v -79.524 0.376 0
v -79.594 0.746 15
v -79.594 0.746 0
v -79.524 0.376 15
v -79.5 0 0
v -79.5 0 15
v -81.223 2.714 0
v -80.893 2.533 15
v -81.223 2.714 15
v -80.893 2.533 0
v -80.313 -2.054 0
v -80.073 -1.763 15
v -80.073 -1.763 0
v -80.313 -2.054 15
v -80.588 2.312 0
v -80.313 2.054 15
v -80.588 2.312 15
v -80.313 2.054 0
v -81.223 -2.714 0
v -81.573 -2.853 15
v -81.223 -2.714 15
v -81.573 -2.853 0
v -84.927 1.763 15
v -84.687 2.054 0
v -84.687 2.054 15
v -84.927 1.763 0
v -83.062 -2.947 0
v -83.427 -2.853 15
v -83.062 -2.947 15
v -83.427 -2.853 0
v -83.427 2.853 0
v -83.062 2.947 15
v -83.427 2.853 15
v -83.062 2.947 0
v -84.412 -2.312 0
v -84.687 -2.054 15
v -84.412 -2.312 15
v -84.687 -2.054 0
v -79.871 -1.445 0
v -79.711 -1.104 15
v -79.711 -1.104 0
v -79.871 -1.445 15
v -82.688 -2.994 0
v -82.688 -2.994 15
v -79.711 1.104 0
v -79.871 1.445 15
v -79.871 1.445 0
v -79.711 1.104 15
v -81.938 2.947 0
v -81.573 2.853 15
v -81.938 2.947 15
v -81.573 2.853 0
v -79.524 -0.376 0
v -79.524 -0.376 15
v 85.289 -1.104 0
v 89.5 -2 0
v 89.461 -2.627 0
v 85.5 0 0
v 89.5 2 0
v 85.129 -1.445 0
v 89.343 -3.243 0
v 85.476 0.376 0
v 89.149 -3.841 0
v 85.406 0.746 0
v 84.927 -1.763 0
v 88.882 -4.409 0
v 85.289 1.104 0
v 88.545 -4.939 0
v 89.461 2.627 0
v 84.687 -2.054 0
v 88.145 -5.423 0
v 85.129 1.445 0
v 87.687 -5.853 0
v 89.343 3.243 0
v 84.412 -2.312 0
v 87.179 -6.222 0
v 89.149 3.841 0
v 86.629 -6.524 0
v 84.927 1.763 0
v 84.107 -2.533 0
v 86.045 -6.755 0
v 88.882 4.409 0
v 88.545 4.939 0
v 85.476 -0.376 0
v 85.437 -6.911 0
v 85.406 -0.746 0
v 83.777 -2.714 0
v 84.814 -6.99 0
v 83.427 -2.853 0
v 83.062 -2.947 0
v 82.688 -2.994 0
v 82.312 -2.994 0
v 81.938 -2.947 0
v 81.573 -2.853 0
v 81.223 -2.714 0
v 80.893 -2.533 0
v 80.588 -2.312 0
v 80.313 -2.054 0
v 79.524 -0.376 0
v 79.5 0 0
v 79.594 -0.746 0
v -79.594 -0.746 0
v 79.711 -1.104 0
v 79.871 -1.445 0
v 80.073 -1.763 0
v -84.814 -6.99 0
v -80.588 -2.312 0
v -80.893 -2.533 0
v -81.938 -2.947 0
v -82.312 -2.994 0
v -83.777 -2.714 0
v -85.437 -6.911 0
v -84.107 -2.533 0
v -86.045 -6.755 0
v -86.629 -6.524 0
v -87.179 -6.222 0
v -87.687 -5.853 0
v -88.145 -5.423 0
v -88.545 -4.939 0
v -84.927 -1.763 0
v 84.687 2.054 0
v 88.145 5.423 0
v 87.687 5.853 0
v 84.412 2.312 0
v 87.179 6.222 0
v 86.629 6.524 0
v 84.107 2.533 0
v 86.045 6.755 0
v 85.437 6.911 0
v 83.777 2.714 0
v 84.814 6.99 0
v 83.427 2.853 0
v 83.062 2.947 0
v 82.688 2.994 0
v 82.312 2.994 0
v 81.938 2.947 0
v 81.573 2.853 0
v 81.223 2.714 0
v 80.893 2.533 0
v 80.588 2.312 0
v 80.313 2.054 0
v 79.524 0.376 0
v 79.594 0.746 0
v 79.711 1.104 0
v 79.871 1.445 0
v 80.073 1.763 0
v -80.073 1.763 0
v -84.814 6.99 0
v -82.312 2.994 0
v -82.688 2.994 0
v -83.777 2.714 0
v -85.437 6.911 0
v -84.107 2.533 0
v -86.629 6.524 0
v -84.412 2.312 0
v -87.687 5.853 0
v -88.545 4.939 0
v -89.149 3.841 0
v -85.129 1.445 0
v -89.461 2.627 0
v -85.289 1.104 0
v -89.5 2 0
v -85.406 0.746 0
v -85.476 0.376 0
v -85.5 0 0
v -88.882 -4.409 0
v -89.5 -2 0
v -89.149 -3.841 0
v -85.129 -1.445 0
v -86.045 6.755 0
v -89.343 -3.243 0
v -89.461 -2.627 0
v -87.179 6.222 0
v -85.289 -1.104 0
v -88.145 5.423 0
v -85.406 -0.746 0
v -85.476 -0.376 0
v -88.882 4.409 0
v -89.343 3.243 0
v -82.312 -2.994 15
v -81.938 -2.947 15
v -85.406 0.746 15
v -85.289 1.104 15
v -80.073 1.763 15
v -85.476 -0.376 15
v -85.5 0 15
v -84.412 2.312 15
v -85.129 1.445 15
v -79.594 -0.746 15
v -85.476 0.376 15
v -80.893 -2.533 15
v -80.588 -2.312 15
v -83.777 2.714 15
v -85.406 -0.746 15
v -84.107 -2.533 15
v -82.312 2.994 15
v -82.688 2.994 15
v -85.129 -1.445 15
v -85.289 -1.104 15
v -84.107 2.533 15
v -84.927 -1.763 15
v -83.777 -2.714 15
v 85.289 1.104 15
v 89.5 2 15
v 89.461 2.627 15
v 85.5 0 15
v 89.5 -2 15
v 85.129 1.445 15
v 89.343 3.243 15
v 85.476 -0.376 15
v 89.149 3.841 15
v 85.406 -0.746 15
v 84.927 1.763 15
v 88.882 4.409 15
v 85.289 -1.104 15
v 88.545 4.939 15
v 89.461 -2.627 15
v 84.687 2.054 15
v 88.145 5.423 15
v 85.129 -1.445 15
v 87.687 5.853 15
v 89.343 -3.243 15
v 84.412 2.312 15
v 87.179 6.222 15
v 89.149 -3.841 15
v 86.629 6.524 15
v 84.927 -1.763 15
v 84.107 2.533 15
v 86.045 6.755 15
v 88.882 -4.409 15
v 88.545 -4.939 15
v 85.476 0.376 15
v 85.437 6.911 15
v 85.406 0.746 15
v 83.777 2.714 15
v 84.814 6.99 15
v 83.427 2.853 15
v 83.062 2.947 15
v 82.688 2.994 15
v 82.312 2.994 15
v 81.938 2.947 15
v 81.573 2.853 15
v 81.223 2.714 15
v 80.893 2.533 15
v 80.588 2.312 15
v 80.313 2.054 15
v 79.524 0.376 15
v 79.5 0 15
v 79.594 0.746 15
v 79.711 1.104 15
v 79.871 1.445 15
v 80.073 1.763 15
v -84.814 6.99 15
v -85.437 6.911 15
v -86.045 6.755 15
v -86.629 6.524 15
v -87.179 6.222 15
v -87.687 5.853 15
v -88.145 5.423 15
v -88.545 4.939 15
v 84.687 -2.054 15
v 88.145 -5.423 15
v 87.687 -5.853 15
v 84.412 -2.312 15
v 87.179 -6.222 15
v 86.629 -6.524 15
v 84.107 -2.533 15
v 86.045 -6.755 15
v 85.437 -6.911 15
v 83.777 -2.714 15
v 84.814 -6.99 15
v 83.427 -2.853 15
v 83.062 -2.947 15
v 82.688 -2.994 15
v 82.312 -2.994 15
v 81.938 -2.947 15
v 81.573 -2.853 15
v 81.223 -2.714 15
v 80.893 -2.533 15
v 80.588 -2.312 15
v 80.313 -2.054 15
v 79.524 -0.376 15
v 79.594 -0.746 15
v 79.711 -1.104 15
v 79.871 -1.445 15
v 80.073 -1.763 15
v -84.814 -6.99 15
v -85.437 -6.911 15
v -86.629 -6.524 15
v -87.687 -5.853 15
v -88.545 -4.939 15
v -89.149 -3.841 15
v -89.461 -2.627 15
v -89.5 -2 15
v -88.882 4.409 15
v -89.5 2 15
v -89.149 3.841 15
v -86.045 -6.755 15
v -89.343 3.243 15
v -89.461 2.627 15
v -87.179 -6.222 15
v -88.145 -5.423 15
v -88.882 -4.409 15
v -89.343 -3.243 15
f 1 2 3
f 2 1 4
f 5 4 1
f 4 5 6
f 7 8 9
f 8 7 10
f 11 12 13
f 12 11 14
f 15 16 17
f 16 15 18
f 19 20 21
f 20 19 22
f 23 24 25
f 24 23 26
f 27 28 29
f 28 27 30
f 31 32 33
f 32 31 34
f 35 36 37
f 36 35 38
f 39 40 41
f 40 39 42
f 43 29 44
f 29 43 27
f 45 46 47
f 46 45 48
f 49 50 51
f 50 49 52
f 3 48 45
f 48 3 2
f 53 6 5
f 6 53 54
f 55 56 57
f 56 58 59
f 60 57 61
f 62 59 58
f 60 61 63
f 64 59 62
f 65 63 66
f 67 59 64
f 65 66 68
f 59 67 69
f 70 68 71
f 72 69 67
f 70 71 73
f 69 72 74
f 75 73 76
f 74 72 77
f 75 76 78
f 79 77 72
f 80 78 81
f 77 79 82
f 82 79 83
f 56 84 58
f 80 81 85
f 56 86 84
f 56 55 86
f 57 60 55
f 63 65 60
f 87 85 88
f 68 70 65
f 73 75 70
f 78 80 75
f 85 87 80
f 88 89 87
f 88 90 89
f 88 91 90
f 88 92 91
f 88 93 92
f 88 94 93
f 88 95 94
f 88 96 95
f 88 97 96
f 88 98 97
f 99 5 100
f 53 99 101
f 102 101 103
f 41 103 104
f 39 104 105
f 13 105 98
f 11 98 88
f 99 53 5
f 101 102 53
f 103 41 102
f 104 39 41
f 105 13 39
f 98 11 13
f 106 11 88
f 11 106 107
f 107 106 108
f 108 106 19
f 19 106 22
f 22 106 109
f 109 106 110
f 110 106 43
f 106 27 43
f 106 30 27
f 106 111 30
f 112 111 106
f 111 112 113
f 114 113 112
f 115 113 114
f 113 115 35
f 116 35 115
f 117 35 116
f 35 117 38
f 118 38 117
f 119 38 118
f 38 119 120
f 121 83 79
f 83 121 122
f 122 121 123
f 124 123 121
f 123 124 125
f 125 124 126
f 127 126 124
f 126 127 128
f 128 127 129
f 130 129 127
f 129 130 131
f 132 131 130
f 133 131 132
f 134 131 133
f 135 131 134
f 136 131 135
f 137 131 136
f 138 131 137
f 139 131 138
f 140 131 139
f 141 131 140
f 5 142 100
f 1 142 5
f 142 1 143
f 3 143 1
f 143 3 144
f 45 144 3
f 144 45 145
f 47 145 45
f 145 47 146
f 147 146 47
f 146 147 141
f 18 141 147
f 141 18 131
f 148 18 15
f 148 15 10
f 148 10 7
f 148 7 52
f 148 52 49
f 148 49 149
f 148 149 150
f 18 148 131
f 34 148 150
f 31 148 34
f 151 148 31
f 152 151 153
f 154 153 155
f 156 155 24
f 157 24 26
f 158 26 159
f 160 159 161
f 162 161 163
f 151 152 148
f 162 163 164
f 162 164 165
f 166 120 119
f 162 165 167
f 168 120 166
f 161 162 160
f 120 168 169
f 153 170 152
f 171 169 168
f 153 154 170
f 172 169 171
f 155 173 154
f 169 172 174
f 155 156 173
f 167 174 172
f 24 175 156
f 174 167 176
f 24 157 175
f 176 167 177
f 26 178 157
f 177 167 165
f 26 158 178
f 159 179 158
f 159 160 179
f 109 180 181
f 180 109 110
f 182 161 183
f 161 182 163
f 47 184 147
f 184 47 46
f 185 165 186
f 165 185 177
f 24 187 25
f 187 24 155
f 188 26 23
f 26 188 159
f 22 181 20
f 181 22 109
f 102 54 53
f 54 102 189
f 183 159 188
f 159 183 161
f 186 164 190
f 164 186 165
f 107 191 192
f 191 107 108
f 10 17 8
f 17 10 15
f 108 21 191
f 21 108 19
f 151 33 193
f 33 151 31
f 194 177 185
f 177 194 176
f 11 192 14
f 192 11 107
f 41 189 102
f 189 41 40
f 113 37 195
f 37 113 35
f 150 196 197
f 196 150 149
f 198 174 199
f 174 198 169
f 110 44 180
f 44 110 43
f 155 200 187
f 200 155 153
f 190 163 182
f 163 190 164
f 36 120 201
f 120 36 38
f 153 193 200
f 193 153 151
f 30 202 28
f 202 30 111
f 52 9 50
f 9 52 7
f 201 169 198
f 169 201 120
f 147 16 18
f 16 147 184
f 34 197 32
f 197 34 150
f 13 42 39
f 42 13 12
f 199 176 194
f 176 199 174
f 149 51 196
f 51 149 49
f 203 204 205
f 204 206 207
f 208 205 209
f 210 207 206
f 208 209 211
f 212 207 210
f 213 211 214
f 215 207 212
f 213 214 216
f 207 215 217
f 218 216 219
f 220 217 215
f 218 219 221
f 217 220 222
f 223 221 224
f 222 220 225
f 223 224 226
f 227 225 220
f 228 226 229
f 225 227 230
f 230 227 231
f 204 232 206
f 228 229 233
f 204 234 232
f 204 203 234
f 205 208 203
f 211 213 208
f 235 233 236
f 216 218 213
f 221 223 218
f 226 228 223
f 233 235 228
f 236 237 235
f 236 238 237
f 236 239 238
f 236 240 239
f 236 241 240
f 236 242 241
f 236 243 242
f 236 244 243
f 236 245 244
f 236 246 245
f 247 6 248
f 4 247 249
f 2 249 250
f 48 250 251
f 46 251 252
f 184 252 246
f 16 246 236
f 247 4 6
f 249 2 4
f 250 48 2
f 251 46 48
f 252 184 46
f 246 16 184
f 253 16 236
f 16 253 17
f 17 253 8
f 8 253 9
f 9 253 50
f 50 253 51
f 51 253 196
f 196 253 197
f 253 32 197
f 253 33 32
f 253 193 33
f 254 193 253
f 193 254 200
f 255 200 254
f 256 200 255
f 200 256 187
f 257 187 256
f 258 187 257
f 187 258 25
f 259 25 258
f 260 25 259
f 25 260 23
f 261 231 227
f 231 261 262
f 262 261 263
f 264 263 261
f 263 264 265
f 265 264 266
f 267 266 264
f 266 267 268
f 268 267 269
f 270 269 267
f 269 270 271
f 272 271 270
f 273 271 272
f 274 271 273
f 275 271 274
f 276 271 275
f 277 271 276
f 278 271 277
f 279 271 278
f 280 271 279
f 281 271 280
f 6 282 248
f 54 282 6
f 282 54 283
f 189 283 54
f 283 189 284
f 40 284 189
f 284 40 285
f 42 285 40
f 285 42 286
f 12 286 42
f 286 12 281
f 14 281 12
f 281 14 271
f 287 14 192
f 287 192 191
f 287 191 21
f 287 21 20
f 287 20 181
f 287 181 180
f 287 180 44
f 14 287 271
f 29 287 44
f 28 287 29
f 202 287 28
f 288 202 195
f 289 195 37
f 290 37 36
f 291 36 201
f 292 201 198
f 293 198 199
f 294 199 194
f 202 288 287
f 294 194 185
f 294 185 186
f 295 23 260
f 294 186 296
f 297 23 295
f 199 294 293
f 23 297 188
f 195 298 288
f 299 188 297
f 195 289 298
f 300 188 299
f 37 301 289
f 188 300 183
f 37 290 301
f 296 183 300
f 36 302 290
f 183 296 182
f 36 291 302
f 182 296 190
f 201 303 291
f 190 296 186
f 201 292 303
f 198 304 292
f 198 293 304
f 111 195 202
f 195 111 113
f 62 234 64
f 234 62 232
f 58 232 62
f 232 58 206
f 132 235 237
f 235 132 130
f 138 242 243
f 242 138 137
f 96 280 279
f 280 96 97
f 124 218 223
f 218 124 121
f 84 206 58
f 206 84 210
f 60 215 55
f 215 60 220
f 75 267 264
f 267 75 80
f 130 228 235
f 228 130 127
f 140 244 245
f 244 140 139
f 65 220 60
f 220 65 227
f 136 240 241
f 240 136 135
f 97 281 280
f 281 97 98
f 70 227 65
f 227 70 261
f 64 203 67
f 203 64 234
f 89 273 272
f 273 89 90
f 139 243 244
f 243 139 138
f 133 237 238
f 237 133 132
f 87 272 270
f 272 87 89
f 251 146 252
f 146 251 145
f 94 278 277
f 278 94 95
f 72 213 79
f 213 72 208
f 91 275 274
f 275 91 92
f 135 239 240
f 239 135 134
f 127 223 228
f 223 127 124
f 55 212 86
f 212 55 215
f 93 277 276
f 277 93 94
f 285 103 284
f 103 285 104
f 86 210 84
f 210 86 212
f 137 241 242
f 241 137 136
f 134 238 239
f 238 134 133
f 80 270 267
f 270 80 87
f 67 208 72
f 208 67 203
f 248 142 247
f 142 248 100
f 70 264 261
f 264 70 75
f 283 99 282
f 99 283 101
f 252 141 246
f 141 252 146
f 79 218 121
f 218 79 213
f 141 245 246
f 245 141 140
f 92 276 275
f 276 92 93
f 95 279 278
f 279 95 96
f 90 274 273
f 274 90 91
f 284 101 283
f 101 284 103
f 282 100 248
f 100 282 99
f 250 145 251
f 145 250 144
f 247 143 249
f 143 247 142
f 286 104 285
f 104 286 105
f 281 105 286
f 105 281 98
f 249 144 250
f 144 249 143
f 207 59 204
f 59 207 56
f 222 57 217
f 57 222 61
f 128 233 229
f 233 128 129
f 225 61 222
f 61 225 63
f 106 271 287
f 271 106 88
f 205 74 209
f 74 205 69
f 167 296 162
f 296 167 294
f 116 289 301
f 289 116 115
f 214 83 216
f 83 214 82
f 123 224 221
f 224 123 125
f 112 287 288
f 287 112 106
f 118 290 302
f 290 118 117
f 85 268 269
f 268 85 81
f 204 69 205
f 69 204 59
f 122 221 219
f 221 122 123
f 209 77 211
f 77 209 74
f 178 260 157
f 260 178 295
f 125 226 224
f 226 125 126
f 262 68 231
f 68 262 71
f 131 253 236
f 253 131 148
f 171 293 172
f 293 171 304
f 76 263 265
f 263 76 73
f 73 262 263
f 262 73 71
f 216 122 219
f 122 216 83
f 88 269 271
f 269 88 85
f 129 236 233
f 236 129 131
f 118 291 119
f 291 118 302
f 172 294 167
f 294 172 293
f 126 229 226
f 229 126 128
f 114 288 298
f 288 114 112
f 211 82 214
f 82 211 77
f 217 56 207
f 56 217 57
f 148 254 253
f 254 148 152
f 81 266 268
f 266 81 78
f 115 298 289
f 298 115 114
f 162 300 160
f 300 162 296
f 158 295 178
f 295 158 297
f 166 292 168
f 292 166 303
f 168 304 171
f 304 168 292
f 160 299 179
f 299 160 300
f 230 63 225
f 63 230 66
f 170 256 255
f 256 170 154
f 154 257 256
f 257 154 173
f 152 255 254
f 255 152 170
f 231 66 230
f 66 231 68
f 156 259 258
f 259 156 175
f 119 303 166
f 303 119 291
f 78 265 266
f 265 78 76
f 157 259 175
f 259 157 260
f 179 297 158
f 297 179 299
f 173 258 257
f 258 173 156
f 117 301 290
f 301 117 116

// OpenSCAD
$fn = 50;


difference() {
	union() {
		hull() {
			translate(v = [-84.5000000000, 2.0000000000, 0]) {
				cylinder(h = 15, r = 5);
			}
			translate(v = [84.5000000000, 2.0000000000, 0]) {
				cylinder(h = 15, r = 5);
			}
			translate(v = [-84.5000000000, -2.0000000000, 0]) {
				cylinder(h = 15, r = 5);
			}
			translate(v = [84.5000000000, -2.0000000000, 0]) {
				cylinder(h = 15, r = 5);
			}
		}
	}
	union() {
		translate(v = [-82.5000000000, 0.0000000000, 0]) {
			cylinder(h = 15, r = 3.0000000000);
		}
		translate(v = [82.5000000000, 0.0000000000, 0]) {
			cylinder(h = 15, r = 3.0000000000);
		}
		translate(v = [-82.5000000000, 0.0000000000, 0]) {
			cylinder(h = 15, r = 1.5000000000);
		}
		translate(v = [82.5000000000, 0.0000000000, 0]) {
			cylinder(h = 15, r = 1.5000000000);
		}
		translate(v = [-82.5000000000, 0.0000000000, 0]) {
			cylinder(h = 15, r = 1.5000000000);
		}
		translate(v = [82.5000000000, 0.0000000000, 0]) {
			cylinder(h = 15, r = 1.5000000000);
		}
		translate(v = [-82.5000000000, 0.0000000000, 0]) {
			cylinder(h = 15, r = 1.5000000000);
		}
		translate(v = [82.5000000000, 0.0000000000, 0]) {
			cylinder(h = 15, r = 1.5000000000);
		}
	}
}
